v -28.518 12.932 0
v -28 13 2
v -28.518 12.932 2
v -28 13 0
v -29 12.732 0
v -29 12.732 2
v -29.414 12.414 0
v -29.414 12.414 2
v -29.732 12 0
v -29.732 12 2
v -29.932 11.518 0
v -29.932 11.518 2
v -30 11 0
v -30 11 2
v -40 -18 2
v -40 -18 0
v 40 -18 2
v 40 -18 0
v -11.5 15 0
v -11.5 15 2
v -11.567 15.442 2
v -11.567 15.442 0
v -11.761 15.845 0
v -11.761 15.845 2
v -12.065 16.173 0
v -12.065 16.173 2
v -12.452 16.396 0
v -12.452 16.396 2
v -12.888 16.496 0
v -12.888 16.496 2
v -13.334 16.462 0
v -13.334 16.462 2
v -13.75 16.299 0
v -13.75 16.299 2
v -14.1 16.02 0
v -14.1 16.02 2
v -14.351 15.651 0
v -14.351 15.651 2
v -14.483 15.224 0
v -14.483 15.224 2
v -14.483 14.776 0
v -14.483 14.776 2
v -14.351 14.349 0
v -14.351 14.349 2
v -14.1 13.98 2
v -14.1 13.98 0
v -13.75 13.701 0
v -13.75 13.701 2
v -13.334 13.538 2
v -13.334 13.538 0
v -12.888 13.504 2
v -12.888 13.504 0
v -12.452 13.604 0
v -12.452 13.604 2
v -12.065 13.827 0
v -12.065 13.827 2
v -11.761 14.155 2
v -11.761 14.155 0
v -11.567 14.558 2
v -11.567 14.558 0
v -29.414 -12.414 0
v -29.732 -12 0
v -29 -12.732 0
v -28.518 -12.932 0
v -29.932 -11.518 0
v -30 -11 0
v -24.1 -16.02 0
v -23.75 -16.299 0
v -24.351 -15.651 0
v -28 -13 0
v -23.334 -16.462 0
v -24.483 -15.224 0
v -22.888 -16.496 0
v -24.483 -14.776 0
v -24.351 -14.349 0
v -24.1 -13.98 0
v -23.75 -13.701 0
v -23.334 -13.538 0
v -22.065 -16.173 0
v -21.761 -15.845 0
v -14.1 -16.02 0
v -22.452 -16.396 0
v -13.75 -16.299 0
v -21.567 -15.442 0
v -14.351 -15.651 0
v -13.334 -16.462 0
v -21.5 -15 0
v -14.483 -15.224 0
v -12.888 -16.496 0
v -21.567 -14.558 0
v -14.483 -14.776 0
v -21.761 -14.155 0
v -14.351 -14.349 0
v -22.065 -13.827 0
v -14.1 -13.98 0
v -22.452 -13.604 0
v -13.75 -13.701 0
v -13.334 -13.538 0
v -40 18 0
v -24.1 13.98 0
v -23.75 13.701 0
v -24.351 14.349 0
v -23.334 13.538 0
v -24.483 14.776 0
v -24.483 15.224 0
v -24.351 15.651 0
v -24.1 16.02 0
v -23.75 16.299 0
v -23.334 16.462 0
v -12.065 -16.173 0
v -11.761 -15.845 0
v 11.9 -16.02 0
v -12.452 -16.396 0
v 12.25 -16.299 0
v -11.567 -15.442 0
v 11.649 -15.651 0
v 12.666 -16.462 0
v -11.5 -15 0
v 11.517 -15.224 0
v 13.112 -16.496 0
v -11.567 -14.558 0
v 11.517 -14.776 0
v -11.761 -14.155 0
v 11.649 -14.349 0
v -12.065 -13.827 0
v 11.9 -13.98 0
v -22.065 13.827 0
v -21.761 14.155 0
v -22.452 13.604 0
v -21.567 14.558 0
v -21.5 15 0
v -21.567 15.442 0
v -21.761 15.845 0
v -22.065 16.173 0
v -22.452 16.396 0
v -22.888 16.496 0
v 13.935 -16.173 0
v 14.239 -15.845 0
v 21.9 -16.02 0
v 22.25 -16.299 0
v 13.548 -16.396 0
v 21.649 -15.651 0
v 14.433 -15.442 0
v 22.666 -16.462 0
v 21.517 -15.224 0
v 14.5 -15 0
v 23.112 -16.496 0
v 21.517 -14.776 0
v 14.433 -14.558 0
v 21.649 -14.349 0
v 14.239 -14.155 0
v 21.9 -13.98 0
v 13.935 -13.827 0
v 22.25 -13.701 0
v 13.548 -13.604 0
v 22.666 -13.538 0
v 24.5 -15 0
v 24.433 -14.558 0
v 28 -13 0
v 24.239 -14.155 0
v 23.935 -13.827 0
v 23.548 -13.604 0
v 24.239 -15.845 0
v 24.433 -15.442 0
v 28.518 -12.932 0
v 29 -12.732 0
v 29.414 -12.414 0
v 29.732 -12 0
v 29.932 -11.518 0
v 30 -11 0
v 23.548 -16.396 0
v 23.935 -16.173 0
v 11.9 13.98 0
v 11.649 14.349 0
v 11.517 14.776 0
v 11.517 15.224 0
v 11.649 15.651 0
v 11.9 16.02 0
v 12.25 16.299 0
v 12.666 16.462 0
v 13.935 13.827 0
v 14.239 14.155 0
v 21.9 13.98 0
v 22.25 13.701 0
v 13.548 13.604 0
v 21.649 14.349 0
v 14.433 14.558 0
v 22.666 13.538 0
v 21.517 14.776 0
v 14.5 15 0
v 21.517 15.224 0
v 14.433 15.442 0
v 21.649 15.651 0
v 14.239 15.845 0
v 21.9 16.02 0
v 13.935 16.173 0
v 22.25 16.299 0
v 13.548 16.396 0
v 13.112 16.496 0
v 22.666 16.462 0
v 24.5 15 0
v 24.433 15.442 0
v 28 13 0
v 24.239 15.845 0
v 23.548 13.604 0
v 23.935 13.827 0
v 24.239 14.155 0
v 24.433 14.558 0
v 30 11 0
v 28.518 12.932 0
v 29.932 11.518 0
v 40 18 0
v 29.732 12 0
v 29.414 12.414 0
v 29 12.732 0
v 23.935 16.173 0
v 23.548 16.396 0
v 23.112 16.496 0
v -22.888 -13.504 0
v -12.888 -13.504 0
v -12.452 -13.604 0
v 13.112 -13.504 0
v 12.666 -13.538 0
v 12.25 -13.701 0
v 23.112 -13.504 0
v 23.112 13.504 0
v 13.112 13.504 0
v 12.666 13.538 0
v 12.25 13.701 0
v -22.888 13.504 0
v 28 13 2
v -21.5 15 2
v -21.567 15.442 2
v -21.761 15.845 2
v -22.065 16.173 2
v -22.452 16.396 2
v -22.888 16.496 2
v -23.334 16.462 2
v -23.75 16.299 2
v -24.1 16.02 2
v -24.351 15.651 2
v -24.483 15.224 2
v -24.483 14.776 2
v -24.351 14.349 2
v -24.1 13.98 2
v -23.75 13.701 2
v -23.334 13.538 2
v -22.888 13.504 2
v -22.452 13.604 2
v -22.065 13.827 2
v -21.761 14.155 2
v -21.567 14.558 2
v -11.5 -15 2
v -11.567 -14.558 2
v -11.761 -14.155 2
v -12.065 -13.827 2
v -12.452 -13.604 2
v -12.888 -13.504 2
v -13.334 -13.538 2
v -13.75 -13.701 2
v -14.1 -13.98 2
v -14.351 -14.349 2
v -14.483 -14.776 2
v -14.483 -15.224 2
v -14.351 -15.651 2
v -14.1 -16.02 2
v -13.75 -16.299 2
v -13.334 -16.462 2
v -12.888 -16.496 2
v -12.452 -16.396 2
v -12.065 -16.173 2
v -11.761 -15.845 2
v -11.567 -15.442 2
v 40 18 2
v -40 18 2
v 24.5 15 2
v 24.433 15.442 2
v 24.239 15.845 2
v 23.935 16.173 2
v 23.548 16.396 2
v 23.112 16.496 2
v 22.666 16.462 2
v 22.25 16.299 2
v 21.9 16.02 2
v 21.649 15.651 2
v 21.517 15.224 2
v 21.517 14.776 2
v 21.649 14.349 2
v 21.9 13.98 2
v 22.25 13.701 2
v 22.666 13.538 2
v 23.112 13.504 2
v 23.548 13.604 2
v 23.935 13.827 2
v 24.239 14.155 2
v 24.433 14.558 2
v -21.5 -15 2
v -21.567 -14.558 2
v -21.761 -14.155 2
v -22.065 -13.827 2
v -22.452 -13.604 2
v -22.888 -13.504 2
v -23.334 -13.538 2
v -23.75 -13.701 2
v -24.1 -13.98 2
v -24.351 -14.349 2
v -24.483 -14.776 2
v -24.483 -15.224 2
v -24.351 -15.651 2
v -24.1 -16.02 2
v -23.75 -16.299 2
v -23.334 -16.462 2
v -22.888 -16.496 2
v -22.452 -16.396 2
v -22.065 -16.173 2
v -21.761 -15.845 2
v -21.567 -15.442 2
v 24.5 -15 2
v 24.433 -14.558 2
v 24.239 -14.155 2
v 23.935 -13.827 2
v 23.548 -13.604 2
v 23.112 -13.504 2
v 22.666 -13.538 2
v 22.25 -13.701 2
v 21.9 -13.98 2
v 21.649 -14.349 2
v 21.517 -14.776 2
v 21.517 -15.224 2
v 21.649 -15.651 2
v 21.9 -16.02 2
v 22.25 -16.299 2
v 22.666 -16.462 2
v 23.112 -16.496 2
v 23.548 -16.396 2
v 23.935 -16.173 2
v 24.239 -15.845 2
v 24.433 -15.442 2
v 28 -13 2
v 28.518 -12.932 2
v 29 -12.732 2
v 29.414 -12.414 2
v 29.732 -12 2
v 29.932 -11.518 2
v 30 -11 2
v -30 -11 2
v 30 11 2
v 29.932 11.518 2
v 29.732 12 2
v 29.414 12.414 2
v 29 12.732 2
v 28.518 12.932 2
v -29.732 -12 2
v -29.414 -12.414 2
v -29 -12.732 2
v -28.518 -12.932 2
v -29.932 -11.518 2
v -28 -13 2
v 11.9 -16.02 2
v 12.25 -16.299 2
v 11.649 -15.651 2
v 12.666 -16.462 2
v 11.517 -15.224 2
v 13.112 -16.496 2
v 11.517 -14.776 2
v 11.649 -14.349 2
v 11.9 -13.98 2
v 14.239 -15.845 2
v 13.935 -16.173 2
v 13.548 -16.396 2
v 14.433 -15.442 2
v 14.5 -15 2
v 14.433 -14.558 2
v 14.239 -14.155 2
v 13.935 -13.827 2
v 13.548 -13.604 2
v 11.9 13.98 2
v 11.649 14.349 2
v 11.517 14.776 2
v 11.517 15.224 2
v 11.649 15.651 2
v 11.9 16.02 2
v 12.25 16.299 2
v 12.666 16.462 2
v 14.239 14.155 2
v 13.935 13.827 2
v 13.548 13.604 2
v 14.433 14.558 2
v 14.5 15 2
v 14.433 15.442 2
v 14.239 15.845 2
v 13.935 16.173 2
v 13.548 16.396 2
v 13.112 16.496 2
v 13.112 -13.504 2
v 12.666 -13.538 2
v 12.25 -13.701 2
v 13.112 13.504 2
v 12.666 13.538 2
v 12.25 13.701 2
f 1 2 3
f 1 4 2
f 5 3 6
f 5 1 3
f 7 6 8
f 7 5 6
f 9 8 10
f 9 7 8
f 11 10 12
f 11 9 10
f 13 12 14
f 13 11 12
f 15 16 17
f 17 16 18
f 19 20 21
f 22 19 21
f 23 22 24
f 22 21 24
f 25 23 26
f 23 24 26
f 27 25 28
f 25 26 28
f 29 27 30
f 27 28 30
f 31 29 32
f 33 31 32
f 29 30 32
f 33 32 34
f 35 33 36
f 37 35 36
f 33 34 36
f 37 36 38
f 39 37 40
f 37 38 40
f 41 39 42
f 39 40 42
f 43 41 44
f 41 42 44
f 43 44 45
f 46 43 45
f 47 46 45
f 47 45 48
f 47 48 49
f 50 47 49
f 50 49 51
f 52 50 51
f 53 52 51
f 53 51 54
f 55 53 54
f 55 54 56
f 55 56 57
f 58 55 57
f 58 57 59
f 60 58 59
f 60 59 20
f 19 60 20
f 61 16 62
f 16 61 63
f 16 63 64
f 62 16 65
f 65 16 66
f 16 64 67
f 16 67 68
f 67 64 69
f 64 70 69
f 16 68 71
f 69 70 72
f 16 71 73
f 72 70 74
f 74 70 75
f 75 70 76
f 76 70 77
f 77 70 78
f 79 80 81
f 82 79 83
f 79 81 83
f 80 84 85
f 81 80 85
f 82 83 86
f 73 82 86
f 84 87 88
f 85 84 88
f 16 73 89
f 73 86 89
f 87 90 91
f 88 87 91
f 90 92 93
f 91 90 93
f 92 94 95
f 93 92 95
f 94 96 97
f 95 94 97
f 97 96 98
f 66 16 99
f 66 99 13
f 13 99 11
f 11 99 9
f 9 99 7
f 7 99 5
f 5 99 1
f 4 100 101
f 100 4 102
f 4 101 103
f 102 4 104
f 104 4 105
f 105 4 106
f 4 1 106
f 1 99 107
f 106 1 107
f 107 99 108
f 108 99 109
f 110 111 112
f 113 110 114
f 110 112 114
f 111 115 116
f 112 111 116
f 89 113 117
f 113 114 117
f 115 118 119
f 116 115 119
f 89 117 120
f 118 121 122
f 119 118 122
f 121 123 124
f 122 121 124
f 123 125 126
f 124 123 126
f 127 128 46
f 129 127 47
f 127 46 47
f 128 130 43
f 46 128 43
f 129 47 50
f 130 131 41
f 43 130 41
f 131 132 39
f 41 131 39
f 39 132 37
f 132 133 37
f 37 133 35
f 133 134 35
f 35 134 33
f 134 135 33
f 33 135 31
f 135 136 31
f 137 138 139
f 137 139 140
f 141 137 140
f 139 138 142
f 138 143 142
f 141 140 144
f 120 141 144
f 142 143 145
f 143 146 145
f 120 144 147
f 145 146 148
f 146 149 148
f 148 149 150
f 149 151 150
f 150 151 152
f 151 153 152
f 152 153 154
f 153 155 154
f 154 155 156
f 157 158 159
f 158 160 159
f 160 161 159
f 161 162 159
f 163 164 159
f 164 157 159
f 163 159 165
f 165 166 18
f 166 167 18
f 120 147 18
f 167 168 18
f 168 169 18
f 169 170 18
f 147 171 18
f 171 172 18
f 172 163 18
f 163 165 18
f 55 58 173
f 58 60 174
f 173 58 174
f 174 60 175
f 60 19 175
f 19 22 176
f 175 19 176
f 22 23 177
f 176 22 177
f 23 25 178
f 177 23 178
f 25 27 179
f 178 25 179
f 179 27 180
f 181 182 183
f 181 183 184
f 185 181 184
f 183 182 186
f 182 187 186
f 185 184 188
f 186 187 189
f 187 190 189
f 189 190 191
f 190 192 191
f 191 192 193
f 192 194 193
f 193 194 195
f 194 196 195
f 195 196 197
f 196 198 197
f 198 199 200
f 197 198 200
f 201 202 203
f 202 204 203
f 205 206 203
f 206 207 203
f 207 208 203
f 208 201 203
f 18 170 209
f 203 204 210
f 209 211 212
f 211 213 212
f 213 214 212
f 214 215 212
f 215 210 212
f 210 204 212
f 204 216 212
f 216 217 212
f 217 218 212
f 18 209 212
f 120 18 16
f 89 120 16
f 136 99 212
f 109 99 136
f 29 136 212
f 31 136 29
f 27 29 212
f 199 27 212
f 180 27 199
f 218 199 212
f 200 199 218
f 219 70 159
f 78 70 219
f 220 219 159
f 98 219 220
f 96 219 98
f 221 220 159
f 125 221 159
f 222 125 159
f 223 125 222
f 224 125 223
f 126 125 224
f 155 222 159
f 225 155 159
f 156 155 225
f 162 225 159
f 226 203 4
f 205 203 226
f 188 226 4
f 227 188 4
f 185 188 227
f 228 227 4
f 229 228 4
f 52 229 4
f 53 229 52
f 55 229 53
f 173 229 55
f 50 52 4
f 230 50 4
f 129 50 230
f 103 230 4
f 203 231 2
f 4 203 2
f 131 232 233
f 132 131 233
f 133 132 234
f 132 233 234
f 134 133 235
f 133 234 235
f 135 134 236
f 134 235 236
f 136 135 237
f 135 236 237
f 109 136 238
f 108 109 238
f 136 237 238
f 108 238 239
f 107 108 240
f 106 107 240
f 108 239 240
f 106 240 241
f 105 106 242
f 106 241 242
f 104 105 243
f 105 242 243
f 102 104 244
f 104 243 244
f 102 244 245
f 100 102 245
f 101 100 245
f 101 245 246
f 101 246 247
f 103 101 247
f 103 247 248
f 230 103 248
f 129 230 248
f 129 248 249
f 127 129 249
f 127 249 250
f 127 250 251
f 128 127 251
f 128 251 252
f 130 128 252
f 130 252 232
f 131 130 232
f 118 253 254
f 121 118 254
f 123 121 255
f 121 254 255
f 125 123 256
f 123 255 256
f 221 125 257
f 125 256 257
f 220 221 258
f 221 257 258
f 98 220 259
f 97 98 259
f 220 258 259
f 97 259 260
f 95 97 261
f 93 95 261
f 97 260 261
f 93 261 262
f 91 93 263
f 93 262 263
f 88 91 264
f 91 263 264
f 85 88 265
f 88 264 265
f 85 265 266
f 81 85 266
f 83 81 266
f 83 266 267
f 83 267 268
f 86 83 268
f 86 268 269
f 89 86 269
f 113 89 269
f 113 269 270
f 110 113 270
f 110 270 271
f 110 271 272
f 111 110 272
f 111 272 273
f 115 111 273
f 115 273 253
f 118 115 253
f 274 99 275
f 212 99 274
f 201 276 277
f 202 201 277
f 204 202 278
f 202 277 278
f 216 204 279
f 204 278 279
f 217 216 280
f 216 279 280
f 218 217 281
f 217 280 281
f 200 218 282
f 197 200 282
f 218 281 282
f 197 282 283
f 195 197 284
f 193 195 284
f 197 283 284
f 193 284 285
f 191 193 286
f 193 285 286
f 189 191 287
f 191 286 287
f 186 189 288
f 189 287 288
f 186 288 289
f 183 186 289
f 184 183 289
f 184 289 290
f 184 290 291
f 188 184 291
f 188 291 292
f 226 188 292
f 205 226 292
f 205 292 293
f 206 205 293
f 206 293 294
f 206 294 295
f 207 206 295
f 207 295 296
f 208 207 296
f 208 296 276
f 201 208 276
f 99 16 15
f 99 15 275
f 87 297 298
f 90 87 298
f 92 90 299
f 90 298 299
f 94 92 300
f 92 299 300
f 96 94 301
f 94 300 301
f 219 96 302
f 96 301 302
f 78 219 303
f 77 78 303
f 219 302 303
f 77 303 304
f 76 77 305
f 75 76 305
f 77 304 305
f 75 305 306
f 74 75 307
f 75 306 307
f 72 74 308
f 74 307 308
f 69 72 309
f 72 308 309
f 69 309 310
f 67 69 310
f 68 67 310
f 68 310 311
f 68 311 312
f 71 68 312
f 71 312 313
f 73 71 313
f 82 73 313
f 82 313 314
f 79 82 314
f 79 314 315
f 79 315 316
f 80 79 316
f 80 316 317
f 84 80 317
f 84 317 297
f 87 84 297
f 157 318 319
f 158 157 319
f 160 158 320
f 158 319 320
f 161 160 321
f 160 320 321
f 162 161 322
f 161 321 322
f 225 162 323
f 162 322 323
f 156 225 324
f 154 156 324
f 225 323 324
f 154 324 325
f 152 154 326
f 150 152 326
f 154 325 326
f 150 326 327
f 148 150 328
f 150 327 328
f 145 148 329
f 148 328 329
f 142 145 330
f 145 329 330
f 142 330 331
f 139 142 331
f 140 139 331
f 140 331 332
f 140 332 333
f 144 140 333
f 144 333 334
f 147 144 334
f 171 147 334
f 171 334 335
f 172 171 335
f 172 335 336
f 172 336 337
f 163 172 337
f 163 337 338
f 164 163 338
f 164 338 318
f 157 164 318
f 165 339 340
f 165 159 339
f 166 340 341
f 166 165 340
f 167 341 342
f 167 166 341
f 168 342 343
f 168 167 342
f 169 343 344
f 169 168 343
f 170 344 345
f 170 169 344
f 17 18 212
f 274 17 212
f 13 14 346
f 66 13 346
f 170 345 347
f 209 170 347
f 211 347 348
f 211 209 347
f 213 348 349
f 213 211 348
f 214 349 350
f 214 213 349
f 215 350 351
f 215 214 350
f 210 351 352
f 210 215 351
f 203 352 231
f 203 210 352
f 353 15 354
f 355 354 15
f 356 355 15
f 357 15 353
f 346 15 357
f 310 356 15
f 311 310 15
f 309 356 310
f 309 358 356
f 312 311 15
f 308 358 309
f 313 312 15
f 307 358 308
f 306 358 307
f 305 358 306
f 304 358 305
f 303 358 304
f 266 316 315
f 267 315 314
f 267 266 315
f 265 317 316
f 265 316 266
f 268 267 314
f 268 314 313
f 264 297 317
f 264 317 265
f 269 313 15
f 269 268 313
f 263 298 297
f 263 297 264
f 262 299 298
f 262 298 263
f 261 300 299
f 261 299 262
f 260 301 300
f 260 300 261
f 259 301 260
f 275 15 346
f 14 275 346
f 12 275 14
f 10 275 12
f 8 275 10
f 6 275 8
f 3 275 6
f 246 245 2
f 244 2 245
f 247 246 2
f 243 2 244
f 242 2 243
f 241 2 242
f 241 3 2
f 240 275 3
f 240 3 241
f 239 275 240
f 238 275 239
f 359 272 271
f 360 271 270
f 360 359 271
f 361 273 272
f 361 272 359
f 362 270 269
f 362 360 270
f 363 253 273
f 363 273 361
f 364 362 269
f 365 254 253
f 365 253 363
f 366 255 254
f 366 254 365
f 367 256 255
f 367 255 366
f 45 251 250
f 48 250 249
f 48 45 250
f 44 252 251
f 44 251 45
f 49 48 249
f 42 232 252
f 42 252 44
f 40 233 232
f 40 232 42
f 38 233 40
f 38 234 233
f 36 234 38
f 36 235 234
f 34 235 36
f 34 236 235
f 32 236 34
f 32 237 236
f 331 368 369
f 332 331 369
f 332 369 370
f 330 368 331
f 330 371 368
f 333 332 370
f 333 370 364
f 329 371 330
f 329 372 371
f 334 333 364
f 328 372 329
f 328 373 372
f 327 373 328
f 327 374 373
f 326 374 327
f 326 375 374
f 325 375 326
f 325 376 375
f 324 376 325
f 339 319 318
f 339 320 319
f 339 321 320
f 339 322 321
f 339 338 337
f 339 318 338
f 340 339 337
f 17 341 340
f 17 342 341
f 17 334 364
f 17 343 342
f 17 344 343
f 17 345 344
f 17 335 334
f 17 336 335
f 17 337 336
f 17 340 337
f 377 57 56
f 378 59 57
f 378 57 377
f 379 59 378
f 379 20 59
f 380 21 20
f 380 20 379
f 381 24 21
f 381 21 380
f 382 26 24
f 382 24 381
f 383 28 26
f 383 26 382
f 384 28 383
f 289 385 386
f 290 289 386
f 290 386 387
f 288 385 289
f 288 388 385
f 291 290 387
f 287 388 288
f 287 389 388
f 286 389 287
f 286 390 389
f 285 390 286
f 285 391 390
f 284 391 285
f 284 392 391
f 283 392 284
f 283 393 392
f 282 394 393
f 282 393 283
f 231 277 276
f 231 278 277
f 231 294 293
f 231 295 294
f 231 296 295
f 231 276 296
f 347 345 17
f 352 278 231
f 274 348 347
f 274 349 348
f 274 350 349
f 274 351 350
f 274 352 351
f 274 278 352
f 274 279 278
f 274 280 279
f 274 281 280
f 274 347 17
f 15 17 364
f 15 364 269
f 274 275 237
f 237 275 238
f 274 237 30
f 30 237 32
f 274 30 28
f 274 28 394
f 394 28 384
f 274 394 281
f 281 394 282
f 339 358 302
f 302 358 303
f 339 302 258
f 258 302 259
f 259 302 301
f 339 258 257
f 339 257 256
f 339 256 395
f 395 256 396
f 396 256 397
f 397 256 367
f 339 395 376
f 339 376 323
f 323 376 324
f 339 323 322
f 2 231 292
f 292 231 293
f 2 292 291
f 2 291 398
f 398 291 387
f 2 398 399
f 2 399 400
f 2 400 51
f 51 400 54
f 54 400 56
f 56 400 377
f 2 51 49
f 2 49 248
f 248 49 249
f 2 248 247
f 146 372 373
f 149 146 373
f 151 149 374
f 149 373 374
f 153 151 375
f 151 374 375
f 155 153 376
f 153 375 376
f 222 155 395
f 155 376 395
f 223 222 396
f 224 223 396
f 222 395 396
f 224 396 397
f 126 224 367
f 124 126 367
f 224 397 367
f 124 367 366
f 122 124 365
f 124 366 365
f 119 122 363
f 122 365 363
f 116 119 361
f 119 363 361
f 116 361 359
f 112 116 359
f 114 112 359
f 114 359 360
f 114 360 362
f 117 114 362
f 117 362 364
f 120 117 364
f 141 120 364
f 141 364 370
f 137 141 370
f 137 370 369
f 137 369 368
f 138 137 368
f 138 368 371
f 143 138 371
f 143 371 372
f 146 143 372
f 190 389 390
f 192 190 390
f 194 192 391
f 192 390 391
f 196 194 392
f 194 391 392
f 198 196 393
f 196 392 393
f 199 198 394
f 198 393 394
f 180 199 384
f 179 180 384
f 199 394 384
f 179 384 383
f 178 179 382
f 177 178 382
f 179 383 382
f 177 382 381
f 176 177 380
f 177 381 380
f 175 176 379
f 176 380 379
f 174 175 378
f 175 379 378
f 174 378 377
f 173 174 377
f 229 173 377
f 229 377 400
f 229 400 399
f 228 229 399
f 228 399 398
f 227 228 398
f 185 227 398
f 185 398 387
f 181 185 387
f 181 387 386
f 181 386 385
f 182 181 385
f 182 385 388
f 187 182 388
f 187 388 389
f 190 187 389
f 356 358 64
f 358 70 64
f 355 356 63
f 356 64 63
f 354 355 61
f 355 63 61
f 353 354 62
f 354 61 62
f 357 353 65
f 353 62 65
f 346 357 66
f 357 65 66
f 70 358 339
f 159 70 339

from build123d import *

# Parameters (mm, degrees)
SKETCH_1_W          = 80
SKETCH_1_H          = 36
EXTRUDE_1_DEPTH     = 2
CUT_EXTRUDE_1_DEPTH = 2
FILLET_2_R          = 2
SKETCH_3_R          = 1.5
CUT_EXTRUDE_2_DEPTH = 44.9089968


with BuildPart() as part:
    # 草图1 → 凸台-拉伸1 (new body)
    with BuildSketch(Plane.XY):
        Rectangle(SKETCH_1_W, SKETCH_1_H)
    extrude(amount=EXTRUDE_1_DEPTH)

    # 草图2 → 切除-拉伸1 (cut)
    with BuildSketch(Plane.XY.offset(2)):
        Polygon((-30, -8), (-30, -13), (30, -13), (30, -8), (30, 8), (30, 13), (-30, 13), (-30, 8), align=None)
    extrude(amount=-CUT_EXTRUDE_1_DEPTH, mode=Mode.SUBTRACT)

    # 圆角2
    fillet_2_edges = [part.edges().sort_by_distance(p)[0] for p in [
        (30, -13, 1),
        (-30, -13, 1),
        (-30, 13, 1),
        (30, 13, 1),
    ]]
    fillet(fillet_2_edges, radius=FILLET_2_R)

    # 草图3 → 切除-拉伸2 (cut, through all)
    with BuildSketch(Plane.XY.offset(2)):
        with Locations((23, -15)):
            Circle(SKETCH_3_R)
        with Locations((13, -15)):
            Circle(SKETCH_3_R)
        with Locations((-13, -15)):
            Circle(SKETCH_3_R)
        with Locations((-23, -15)):
            Circle(SKETCH_3_R)
        with Locations((23, 15)):
            Circle(SKETCH_3_R)
        with Locations((13, 15)):
            Circle(SKETCH_3_R)
        with Locations((-13, 15)):
            Circle(SKETCH_3_R)
        with Locations((-23, 15)):
            Circle(SKETCH_3_R)
    extrude(amount=-CUT_EXTRUDE_2_DEPTH, mode=Mode.SUBTRACT)


solid = part.part
